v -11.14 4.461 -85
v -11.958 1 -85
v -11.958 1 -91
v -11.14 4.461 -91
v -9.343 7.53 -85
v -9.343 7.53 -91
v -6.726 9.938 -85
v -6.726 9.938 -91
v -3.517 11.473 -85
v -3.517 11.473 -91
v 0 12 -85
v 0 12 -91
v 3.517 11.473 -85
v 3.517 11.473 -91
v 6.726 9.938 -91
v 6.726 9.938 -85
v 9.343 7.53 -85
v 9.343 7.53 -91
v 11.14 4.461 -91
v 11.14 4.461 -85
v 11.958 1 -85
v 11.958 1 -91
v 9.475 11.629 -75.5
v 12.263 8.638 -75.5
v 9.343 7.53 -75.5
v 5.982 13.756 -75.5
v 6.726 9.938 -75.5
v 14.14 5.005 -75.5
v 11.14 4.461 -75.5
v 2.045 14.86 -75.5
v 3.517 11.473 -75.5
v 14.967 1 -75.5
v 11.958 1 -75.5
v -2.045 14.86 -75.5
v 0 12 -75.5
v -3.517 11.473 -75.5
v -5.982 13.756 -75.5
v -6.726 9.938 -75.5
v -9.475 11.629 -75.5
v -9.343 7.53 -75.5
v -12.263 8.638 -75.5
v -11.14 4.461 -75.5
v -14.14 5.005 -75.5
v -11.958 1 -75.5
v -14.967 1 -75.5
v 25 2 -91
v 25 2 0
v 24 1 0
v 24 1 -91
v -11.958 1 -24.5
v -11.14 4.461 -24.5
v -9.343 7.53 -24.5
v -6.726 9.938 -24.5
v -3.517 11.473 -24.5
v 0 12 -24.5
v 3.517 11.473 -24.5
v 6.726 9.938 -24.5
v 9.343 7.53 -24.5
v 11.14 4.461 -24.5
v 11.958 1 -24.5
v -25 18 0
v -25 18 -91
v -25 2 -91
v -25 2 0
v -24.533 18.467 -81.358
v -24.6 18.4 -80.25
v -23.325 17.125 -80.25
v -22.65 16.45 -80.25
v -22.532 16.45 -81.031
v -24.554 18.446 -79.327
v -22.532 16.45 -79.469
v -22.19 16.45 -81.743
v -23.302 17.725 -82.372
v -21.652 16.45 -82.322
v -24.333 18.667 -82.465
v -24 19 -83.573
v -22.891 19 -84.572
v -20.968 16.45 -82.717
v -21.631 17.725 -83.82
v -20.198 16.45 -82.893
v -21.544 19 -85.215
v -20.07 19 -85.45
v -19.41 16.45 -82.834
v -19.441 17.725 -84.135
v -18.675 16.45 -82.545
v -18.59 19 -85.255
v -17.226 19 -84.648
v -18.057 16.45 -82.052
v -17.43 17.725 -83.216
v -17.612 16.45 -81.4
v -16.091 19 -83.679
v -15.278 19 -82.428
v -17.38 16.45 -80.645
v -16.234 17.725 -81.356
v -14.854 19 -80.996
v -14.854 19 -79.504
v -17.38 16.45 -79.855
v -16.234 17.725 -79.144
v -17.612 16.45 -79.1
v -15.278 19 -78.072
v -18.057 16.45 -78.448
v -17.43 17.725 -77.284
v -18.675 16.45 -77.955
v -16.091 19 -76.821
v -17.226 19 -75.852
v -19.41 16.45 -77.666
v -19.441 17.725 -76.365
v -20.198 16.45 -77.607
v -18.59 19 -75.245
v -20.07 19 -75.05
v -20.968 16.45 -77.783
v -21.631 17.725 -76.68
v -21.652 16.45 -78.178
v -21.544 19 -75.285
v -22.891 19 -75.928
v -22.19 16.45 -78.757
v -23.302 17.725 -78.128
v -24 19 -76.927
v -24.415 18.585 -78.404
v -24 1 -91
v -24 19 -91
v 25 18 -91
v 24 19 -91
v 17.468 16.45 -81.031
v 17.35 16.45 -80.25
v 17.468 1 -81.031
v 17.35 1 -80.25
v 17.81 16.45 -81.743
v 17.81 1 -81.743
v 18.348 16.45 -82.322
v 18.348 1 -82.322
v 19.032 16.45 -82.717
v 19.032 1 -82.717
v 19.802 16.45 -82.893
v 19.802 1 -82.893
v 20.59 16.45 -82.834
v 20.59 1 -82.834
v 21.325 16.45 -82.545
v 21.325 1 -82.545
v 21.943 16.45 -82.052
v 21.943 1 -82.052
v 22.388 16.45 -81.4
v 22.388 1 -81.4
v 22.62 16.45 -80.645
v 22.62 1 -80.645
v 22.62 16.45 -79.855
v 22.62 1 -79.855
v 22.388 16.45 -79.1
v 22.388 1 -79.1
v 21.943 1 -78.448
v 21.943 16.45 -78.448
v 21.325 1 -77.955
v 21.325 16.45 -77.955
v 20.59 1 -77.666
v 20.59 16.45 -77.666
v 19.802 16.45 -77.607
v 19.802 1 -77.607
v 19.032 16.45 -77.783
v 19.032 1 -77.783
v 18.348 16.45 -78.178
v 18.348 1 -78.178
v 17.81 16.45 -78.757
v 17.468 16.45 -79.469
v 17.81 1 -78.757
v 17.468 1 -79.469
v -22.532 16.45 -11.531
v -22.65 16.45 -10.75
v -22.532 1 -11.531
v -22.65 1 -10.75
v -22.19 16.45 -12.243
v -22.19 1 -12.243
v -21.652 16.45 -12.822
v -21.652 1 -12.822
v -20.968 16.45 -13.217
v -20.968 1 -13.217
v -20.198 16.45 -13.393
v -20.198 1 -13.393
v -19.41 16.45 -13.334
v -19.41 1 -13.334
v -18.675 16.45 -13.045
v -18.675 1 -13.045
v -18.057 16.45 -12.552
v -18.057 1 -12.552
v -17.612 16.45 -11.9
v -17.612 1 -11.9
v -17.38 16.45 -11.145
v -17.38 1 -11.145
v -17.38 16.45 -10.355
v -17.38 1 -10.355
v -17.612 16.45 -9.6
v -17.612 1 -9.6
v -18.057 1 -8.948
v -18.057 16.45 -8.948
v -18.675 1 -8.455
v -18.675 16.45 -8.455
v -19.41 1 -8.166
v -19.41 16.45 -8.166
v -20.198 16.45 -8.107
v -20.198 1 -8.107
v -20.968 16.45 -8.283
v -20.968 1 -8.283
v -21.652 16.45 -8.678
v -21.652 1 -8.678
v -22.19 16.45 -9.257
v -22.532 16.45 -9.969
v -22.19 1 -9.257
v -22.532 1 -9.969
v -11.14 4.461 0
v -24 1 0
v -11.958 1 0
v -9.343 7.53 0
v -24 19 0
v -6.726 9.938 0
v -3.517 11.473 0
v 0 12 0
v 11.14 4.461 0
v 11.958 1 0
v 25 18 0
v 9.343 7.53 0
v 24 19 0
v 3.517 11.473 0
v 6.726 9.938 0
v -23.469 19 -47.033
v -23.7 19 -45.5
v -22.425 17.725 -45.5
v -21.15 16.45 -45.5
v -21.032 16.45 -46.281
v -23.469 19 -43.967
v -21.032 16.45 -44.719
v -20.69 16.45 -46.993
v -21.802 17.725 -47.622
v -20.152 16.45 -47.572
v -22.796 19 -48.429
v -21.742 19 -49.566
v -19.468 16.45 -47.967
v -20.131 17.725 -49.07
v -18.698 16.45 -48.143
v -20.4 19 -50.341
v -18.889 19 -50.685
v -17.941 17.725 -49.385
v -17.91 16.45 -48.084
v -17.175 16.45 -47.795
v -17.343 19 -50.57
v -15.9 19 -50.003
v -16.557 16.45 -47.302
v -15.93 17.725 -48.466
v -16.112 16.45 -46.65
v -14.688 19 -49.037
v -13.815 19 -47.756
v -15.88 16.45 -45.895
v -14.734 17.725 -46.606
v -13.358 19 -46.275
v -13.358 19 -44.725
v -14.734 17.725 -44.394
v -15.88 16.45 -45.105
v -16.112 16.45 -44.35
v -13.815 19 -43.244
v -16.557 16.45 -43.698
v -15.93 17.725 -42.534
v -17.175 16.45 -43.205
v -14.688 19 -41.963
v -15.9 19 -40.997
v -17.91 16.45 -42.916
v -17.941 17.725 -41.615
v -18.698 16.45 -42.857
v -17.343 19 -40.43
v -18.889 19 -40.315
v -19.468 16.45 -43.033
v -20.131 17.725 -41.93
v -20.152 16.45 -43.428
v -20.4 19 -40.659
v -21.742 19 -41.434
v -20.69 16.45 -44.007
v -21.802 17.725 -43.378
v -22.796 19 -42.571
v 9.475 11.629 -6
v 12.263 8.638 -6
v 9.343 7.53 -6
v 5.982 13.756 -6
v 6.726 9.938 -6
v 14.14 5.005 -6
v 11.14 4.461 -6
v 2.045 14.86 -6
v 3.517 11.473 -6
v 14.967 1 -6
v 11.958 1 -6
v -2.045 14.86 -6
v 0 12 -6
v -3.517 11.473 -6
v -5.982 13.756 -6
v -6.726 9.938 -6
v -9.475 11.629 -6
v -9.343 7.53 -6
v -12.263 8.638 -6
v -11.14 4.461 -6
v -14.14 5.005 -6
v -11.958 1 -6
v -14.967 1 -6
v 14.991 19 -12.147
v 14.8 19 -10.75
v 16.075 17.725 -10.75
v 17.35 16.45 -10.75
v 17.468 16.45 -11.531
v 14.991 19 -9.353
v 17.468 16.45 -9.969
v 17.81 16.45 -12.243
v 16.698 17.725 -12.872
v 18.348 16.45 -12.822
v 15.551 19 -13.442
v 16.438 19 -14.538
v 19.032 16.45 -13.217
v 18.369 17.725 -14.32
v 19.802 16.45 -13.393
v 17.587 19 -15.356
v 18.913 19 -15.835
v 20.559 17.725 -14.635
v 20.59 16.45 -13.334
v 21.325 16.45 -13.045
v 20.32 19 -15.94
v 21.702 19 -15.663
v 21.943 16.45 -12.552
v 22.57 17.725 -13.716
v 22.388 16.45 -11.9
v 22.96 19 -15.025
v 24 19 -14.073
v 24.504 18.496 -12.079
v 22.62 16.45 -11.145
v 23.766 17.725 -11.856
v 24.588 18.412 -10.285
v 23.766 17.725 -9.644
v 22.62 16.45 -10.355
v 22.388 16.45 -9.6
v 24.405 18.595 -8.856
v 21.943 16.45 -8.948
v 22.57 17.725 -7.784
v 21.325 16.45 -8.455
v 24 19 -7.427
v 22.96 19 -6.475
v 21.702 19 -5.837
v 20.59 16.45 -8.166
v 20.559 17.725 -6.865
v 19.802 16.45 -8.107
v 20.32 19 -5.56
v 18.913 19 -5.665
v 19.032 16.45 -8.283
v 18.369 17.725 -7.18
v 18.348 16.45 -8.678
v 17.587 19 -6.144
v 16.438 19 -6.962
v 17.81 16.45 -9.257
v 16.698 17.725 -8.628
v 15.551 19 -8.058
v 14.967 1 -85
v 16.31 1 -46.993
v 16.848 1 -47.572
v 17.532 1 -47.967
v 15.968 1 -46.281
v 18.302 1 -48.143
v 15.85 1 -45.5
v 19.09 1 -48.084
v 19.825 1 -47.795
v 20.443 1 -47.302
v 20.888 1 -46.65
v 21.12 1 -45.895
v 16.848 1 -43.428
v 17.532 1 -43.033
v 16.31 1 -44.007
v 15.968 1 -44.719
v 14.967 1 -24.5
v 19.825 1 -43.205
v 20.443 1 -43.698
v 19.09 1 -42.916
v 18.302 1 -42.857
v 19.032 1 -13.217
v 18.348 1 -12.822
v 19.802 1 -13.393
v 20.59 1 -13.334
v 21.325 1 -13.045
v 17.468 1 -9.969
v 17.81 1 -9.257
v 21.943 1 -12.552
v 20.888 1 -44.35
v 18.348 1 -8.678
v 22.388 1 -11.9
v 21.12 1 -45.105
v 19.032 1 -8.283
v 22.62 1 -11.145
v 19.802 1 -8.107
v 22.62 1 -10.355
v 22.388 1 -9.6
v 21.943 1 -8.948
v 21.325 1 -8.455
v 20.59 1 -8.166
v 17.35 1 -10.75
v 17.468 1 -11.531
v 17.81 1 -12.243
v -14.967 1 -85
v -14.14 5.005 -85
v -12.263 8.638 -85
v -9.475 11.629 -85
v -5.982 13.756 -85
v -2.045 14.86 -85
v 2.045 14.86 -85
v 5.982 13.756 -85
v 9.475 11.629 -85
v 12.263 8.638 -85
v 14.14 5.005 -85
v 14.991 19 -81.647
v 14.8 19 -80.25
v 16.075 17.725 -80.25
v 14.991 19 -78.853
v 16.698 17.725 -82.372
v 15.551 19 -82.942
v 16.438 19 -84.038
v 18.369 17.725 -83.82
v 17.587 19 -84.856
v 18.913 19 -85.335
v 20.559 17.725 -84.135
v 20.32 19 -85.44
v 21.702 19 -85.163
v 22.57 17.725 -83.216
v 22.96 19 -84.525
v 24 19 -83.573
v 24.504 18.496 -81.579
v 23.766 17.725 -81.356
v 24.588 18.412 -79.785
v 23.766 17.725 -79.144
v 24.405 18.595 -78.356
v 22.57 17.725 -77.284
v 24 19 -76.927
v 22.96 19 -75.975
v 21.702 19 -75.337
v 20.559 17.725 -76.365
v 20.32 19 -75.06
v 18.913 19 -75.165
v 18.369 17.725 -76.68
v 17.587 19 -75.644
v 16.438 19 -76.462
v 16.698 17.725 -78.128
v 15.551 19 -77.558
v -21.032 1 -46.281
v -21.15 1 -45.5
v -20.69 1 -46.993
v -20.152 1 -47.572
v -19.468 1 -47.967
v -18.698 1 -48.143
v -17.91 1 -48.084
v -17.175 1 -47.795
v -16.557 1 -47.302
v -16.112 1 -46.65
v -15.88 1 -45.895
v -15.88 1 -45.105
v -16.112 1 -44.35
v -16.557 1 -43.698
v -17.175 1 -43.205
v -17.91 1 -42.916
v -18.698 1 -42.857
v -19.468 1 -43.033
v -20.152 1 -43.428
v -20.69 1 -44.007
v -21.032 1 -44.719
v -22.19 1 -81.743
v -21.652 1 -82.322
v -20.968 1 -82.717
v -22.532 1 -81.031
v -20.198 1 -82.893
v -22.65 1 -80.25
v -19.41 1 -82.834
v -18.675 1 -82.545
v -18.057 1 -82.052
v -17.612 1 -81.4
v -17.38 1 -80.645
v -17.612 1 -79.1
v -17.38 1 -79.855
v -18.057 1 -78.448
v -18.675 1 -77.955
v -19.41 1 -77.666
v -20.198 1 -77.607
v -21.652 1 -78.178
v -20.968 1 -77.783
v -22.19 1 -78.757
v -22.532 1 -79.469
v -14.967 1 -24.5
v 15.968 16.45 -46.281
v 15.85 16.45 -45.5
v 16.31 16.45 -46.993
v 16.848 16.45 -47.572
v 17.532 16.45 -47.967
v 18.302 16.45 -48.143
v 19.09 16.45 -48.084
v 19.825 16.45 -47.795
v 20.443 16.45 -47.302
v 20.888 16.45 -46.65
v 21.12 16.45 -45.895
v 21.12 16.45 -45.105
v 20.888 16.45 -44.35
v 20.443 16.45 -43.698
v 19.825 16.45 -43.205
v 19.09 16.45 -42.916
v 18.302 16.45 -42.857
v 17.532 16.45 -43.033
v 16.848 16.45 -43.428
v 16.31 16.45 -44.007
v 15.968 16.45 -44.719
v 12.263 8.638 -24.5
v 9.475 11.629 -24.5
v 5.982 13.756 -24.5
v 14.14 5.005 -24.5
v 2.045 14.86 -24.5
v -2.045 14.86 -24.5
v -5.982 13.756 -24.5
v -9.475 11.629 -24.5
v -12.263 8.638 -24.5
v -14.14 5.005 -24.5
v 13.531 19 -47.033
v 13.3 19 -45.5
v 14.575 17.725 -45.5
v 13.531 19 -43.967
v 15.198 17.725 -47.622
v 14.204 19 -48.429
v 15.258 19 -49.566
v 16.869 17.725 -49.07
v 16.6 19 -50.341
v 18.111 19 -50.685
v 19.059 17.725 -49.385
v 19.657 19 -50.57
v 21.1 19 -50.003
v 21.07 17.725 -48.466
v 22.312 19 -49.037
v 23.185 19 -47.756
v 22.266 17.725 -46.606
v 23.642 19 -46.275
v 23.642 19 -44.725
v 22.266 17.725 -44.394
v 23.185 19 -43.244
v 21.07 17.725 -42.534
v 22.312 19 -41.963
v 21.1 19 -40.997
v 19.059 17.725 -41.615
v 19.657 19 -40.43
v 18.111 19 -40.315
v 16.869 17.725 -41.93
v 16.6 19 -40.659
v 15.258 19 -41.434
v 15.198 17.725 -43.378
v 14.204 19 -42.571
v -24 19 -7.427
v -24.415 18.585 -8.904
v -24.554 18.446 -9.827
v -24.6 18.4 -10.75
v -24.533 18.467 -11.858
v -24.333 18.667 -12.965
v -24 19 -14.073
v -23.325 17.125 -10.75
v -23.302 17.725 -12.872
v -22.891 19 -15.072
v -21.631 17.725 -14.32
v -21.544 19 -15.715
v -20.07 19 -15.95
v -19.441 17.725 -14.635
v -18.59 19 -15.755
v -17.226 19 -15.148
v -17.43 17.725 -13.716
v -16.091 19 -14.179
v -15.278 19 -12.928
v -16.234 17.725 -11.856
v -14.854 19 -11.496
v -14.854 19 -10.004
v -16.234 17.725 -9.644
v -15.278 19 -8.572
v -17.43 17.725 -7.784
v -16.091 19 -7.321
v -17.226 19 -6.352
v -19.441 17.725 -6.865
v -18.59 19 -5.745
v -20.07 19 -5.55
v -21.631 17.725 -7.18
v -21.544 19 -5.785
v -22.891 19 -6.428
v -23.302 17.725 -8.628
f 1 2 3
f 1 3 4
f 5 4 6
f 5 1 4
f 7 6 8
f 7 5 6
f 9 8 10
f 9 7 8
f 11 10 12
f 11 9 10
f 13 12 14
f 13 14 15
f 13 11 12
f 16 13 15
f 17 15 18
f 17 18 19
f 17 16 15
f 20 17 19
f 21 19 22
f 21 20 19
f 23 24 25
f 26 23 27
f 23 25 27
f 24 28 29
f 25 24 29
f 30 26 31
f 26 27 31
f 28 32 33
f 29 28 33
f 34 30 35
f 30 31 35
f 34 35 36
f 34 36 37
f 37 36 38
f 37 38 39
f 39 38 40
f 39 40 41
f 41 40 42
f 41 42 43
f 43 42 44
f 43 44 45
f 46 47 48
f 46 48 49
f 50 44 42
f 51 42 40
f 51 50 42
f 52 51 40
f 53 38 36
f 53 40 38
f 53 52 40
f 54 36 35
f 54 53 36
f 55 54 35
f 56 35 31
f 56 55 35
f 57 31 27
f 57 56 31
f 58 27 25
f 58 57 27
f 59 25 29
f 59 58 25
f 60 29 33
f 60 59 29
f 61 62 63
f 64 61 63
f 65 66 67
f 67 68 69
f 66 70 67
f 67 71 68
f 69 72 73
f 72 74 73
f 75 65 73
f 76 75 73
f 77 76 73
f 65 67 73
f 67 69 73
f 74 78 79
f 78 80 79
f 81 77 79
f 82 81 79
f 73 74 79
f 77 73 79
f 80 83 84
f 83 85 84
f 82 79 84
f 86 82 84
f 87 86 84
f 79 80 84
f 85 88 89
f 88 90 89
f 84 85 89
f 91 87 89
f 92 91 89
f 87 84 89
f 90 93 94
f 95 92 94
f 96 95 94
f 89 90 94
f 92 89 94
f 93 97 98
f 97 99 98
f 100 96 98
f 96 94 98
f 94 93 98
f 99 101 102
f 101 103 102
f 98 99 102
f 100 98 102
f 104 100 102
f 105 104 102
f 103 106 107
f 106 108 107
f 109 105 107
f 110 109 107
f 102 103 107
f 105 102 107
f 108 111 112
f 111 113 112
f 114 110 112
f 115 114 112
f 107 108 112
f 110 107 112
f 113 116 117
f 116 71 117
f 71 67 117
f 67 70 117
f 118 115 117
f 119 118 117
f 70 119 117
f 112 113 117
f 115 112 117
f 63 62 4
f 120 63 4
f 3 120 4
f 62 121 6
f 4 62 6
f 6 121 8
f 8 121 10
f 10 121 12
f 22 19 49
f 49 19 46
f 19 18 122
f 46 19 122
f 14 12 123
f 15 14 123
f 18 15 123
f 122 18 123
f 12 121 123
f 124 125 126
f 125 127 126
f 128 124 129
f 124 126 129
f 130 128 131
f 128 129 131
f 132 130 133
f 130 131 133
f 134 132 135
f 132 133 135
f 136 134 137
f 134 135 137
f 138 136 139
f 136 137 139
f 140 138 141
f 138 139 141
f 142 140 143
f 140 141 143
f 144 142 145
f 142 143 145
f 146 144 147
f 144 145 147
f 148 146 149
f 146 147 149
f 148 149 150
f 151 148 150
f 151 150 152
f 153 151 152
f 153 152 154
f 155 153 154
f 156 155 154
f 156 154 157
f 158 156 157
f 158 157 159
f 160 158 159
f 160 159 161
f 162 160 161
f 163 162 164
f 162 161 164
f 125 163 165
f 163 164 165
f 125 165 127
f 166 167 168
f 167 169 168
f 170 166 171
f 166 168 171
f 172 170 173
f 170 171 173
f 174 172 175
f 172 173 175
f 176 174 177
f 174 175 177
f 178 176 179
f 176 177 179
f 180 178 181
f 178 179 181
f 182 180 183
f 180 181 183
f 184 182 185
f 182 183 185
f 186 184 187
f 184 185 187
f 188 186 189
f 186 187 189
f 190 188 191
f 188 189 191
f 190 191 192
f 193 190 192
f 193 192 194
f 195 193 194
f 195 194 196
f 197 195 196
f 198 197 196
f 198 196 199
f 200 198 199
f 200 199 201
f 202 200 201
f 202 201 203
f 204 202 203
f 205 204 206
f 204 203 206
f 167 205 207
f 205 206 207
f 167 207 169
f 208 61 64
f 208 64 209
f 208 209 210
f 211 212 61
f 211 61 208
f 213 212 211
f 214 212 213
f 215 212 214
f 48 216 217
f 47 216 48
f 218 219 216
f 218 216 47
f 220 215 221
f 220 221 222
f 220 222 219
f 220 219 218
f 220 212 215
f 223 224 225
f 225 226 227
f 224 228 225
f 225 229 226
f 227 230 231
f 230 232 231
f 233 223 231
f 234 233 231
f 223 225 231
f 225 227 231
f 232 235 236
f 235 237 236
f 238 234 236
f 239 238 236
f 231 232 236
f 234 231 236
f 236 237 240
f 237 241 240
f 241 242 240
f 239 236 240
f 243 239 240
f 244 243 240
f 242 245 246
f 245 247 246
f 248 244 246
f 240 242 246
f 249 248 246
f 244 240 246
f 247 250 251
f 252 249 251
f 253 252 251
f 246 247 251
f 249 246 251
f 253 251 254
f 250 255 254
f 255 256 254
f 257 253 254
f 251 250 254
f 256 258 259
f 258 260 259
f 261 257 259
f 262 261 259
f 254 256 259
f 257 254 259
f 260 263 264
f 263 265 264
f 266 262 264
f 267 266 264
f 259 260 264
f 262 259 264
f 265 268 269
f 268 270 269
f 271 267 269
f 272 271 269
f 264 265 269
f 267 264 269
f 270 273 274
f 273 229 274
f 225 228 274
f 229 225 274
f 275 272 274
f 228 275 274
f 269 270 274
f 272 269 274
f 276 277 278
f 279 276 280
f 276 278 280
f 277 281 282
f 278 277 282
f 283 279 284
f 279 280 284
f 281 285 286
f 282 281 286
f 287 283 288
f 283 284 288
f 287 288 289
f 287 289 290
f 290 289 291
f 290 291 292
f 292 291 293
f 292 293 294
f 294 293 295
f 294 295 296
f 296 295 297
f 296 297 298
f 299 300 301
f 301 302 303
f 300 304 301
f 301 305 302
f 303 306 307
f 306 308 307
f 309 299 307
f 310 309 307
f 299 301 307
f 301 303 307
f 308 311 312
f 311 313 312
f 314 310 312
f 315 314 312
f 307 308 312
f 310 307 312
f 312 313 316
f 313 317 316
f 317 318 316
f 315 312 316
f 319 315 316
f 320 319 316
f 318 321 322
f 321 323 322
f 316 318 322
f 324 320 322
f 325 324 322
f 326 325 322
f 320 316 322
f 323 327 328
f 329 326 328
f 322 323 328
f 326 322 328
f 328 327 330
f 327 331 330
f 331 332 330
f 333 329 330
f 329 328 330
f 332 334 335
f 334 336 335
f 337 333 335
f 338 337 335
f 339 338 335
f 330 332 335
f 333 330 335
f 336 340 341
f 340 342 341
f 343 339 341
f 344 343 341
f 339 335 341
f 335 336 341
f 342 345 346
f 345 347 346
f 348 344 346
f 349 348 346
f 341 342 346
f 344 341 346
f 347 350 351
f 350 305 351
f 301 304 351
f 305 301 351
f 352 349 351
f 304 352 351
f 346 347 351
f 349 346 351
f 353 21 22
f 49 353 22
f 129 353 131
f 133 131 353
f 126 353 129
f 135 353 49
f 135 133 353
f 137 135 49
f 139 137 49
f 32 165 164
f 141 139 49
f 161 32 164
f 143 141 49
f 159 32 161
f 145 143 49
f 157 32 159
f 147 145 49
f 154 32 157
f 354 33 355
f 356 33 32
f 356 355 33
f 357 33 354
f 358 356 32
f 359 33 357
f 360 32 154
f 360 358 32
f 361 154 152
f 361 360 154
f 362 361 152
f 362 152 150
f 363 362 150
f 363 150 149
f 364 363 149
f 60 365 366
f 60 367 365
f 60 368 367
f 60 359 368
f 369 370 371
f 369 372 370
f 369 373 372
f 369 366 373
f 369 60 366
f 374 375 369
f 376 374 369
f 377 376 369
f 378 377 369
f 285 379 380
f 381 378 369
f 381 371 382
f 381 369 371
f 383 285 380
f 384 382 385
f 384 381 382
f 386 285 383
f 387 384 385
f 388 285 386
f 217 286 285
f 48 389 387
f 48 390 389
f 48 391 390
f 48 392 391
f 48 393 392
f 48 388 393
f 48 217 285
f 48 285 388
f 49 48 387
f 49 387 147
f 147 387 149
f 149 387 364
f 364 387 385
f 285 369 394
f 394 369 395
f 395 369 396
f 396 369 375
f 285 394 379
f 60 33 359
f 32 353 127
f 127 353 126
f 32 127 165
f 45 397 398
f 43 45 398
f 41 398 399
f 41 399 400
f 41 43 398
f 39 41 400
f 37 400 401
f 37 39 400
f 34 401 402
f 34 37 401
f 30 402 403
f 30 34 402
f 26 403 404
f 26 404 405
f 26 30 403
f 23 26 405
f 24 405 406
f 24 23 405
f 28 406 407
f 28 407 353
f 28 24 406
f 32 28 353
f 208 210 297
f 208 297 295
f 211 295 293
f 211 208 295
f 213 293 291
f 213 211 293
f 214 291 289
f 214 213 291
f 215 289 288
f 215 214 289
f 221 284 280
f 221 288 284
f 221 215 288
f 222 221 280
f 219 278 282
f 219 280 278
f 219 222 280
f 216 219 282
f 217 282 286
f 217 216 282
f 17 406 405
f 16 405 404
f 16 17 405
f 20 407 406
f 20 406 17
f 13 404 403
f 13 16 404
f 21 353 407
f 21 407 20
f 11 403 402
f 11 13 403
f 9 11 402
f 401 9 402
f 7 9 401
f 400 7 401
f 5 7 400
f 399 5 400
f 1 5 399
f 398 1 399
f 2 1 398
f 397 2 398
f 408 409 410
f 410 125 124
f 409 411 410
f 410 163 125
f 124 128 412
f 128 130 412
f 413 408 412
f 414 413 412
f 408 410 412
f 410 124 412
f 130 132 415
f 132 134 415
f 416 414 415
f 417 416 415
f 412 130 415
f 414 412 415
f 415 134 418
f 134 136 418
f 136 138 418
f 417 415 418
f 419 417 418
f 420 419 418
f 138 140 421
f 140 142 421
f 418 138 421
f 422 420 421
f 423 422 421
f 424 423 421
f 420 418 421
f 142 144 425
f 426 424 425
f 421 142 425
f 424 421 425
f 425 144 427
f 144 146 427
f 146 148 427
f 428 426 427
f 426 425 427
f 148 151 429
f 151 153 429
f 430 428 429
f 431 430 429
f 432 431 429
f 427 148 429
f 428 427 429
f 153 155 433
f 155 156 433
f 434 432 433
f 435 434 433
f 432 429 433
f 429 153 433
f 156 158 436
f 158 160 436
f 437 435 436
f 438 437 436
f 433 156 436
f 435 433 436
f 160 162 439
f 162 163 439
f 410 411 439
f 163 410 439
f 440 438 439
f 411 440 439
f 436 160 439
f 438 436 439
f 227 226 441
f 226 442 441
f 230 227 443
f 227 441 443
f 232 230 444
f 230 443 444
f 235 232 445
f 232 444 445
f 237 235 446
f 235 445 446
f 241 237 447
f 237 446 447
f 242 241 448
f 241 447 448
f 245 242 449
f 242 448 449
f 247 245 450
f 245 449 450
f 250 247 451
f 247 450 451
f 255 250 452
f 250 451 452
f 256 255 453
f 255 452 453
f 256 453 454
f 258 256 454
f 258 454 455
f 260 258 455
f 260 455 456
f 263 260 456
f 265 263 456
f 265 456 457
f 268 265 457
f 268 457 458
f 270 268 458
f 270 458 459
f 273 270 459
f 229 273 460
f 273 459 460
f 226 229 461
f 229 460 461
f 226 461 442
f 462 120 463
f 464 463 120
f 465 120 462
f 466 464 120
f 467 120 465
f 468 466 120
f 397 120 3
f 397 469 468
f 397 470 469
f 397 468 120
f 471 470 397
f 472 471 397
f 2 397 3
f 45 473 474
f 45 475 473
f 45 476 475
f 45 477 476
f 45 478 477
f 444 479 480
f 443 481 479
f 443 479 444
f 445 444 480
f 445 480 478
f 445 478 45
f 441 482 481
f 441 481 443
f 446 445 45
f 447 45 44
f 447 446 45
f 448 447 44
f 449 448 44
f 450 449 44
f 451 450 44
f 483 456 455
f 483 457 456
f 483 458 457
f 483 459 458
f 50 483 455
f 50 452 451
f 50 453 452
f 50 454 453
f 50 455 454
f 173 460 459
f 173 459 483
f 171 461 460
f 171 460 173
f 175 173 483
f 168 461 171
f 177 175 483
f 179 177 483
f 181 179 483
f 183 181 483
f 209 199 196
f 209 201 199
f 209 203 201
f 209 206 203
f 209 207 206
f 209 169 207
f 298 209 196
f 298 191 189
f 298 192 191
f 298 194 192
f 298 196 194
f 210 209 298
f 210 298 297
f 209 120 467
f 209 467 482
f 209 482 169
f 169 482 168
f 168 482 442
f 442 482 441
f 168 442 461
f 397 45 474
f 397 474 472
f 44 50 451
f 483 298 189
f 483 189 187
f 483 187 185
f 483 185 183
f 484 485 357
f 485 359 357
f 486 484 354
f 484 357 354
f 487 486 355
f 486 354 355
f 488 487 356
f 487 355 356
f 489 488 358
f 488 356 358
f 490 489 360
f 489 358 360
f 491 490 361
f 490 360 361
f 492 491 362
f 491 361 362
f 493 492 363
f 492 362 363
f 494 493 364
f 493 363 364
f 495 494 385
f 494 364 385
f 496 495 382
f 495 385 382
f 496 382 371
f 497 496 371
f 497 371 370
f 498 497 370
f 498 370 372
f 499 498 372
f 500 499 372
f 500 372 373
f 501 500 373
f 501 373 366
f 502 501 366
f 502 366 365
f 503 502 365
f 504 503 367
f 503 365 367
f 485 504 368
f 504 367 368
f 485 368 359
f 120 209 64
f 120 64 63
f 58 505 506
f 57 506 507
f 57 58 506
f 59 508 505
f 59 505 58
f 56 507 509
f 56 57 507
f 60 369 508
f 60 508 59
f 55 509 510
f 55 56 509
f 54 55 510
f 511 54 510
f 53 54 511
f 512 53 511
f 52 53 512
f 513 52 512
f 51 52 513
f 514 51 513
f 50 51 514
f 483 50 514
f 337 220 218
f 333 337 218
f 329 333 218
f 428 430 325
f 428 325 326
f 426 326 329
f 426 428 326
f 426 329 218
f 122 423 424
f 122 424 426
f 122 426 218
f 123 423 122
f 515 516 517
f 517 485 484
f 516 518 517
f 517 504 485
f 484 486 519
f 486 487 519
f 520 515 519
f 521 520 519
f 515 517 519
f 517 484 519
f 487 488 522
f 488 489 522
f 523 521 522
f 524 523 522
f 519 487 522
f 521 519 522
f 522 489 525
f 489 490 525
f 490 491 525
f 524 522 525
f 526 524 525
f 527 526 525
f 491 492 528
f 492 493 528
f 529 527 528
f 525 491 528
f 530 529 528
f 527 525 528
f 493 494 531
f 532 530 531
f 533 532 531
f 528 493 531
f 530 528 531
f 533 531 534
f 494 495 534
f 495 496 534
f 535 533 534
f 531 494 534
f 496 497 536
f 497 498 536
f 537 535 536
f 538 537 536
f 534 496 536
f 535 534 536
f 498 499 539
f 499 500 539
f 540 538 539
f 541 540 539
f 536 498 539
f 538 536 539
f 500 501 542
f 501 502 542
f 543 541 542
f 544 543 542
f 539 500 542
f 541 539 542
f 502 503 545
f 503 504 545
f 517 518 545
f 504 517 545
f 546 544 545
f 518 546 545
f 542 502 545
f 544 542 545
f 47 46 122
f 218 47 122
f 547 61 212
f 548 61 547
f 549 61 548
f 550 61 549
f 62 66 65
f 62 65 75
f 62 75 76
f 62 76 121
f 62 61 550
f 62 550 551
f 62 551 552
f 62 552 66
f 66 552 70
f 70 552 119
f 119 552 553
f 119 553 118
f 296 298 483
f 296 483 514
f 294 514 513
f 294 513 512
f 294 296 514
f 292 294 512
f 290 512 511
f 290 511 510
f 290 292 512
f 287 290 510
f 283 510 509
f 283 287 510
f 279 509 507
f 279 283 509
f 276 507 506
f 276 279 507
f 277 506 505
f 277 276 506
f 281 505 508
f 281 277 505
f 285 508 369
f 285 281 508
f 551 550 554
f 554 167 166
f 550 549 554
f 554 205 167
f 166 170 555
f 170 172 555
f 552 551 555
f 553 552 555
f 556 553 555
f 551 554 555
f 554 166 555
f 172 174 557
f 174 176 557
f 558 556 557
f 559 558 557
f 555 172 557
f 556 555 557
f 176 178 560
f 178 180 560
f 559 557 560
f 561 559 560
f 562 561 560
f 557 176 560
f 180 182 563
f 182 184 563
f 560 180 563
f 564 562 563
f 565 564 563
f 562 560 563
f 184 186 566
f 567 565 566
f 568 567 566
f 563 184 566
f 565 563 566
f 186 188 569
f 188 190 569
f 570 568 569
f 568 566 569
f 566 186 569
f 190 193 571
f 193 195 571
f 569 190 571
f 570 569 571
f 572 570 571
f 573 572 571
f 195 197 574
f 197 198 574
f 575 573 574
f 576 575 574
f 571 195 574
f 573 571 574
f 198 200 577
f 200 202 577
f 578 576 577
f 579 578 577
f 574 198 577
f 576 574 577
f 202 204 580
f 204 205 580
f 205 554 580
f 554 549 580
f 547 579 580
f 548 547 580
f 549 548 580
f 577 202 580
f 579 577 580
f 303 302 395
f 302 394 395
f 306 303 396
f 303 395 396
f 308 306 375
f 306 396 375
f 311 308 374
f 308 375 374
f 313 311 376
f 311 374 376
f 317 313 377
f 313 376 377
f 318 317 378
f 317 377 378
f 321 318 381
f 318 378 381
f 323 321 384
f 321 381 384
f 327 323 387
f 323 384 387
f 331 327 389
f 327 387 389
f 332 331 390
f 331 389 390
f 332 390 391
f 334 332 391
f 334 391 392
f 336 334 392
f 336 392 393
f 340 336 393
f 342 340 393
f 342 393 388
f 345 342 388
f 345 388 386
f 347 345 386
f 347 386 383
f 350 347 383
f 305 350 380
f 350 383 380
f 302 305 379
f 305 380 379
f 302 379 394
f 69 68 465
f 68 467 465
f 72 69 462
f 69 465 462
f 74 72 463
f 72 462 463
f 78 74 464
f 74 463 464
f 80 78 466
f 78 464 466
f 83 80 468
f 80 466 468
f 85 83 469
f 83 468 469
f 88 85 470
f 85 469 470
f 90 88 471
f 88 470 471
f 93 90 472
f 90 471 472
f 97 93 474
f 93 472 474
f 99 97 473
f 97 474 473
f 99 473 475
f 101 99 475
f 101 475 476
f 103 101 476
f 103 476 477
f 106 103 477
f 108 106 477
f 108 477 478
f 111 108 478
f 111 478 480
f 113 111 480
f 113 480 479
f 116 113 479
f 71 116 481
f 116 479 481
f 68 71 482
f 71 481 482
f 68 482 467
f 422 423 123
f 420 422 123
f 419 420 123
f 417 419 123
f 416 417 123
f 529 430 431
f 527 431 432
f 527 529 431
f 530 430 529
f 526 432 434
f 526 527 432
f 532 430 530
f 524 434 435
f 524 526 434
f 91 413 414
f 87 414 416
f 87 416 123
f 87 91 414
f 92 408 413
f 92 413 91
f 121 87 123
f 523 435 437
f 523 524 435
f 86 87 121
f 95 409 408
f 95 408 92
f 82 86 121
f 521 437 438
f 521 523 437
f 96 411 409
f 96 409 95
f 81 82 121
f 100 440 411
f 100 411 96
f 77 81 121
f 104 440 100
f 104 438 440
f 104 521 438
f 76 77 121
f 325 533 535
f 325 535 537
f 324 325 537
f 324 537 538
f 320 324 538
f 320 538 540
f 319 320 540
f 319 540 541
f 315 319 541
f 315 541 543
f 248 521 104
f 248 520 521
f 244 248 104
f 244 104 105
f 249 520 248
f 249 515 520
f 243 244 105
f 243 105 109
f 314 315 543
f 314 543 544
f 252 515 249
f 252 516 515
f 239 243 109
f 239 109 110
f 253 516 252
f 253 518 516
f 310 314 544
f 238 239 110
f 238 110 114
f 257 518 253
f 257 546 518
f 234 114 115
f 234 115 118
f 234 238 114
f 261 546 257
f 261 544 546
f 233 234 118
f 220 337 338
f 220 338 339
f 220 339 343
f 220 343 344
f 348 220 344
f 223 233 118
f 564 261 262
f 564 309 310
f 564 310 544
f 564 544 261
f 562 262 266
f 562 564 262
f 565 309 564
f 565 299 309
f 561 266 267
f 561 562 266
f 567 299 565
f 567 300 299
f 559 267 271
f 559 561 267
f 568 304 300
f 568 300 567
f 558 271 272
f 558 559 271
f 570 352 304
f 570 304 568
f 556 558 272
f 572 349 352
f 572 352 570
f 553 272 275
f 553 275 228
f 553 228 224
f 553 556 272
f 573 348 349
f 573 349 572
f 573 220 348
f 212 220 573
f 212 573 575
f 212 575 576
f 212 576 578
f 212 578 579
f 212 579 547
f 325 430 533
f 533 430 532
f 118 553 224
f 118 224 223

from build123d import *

# Parameters (mm, degrees)
BOSS_EXTRUDE1_DEPTH         = 91
CHAMFER1_SIZE               = 1
SKETCH2_W                   = 6.524852915
SKETCH2_H                   = 18.5
SKETCH2_W_2                 = 5.135295392
SKETCH2_H_2                 = 9.5
HOLE_WIZARD_M51_D           = 5.3
HOLE_WIZARD_M51_CSINK_D     = 10.4
HOLE_WIZARD_M51_CSINK_ANGLE = 90


with BuildPart() as part:
    # Sketch1 → Boss-Extrude1 (new body)
    with BuildSketch(Plane.XY):
        with BuildLine():
            Line((11.958260743, 1), (25, 1))
            Line((25, 1), (25, 19))
            Line((25, 19), (-25, 19))
            Line((-25, 19), (-25, 1))
            Line((-25, 1), (-11.958260743, 1))
            ThreePointArc((-11.958260743, 1), (0, 12), (11.958260743, 1))
        make_face()
    extrude(amount=-BOSS_EXTRUDE1_DEPTH)

    # Chamfer1
    chamfer1_edges = [part.edges().sort_by_distance(p)[0] for p in [
        (-25, 19, -45.5),
        (25, 19, -45.5),
        (25, 1, -45.5),
        (-25, 1, -45.5),
    ]]
    chamfer(chamfer1_edges, length=CHAMFER1_SIZE)

    # Sketch2 → Cut-Revolve2 (revolve, cut)
    with BuildSketch(Plane.XZ):
        with Locations((11.737573543, -15.25)):
            Rectangle(SKETCH2_W, SKETCH2_H)
        with Locations((12.432352304, -80.25)):
            Rectangle(SKETCH2_W_2, SKETCH2_H_2)
    revolve(axis=Axis((0, 0, 0), (0, 0, -1)), mode=Mode.SUBTRACT)

    # Зенковка для  винта с плоской головкой M51 (through all)
    with Locations(Plane(origin=(0, 19, 0), x_dir=(1, 0, 0), z_dir=(0, 1, 0))):
        with Locations((-20, 80.25), (20, 80.25), (18.5, 45.5), (-18.5, 45.5), (-20, 10.75), (20, 10.75)):
            CounterSinkHole(HOLE_WIZARD_M51_D / 2, HOLE_WIZARD_M51_CSINK_D / 2, counter_sink_angle=HOLE_WIZARD_M51_CSINK_ANGLE)


solid = part.part
